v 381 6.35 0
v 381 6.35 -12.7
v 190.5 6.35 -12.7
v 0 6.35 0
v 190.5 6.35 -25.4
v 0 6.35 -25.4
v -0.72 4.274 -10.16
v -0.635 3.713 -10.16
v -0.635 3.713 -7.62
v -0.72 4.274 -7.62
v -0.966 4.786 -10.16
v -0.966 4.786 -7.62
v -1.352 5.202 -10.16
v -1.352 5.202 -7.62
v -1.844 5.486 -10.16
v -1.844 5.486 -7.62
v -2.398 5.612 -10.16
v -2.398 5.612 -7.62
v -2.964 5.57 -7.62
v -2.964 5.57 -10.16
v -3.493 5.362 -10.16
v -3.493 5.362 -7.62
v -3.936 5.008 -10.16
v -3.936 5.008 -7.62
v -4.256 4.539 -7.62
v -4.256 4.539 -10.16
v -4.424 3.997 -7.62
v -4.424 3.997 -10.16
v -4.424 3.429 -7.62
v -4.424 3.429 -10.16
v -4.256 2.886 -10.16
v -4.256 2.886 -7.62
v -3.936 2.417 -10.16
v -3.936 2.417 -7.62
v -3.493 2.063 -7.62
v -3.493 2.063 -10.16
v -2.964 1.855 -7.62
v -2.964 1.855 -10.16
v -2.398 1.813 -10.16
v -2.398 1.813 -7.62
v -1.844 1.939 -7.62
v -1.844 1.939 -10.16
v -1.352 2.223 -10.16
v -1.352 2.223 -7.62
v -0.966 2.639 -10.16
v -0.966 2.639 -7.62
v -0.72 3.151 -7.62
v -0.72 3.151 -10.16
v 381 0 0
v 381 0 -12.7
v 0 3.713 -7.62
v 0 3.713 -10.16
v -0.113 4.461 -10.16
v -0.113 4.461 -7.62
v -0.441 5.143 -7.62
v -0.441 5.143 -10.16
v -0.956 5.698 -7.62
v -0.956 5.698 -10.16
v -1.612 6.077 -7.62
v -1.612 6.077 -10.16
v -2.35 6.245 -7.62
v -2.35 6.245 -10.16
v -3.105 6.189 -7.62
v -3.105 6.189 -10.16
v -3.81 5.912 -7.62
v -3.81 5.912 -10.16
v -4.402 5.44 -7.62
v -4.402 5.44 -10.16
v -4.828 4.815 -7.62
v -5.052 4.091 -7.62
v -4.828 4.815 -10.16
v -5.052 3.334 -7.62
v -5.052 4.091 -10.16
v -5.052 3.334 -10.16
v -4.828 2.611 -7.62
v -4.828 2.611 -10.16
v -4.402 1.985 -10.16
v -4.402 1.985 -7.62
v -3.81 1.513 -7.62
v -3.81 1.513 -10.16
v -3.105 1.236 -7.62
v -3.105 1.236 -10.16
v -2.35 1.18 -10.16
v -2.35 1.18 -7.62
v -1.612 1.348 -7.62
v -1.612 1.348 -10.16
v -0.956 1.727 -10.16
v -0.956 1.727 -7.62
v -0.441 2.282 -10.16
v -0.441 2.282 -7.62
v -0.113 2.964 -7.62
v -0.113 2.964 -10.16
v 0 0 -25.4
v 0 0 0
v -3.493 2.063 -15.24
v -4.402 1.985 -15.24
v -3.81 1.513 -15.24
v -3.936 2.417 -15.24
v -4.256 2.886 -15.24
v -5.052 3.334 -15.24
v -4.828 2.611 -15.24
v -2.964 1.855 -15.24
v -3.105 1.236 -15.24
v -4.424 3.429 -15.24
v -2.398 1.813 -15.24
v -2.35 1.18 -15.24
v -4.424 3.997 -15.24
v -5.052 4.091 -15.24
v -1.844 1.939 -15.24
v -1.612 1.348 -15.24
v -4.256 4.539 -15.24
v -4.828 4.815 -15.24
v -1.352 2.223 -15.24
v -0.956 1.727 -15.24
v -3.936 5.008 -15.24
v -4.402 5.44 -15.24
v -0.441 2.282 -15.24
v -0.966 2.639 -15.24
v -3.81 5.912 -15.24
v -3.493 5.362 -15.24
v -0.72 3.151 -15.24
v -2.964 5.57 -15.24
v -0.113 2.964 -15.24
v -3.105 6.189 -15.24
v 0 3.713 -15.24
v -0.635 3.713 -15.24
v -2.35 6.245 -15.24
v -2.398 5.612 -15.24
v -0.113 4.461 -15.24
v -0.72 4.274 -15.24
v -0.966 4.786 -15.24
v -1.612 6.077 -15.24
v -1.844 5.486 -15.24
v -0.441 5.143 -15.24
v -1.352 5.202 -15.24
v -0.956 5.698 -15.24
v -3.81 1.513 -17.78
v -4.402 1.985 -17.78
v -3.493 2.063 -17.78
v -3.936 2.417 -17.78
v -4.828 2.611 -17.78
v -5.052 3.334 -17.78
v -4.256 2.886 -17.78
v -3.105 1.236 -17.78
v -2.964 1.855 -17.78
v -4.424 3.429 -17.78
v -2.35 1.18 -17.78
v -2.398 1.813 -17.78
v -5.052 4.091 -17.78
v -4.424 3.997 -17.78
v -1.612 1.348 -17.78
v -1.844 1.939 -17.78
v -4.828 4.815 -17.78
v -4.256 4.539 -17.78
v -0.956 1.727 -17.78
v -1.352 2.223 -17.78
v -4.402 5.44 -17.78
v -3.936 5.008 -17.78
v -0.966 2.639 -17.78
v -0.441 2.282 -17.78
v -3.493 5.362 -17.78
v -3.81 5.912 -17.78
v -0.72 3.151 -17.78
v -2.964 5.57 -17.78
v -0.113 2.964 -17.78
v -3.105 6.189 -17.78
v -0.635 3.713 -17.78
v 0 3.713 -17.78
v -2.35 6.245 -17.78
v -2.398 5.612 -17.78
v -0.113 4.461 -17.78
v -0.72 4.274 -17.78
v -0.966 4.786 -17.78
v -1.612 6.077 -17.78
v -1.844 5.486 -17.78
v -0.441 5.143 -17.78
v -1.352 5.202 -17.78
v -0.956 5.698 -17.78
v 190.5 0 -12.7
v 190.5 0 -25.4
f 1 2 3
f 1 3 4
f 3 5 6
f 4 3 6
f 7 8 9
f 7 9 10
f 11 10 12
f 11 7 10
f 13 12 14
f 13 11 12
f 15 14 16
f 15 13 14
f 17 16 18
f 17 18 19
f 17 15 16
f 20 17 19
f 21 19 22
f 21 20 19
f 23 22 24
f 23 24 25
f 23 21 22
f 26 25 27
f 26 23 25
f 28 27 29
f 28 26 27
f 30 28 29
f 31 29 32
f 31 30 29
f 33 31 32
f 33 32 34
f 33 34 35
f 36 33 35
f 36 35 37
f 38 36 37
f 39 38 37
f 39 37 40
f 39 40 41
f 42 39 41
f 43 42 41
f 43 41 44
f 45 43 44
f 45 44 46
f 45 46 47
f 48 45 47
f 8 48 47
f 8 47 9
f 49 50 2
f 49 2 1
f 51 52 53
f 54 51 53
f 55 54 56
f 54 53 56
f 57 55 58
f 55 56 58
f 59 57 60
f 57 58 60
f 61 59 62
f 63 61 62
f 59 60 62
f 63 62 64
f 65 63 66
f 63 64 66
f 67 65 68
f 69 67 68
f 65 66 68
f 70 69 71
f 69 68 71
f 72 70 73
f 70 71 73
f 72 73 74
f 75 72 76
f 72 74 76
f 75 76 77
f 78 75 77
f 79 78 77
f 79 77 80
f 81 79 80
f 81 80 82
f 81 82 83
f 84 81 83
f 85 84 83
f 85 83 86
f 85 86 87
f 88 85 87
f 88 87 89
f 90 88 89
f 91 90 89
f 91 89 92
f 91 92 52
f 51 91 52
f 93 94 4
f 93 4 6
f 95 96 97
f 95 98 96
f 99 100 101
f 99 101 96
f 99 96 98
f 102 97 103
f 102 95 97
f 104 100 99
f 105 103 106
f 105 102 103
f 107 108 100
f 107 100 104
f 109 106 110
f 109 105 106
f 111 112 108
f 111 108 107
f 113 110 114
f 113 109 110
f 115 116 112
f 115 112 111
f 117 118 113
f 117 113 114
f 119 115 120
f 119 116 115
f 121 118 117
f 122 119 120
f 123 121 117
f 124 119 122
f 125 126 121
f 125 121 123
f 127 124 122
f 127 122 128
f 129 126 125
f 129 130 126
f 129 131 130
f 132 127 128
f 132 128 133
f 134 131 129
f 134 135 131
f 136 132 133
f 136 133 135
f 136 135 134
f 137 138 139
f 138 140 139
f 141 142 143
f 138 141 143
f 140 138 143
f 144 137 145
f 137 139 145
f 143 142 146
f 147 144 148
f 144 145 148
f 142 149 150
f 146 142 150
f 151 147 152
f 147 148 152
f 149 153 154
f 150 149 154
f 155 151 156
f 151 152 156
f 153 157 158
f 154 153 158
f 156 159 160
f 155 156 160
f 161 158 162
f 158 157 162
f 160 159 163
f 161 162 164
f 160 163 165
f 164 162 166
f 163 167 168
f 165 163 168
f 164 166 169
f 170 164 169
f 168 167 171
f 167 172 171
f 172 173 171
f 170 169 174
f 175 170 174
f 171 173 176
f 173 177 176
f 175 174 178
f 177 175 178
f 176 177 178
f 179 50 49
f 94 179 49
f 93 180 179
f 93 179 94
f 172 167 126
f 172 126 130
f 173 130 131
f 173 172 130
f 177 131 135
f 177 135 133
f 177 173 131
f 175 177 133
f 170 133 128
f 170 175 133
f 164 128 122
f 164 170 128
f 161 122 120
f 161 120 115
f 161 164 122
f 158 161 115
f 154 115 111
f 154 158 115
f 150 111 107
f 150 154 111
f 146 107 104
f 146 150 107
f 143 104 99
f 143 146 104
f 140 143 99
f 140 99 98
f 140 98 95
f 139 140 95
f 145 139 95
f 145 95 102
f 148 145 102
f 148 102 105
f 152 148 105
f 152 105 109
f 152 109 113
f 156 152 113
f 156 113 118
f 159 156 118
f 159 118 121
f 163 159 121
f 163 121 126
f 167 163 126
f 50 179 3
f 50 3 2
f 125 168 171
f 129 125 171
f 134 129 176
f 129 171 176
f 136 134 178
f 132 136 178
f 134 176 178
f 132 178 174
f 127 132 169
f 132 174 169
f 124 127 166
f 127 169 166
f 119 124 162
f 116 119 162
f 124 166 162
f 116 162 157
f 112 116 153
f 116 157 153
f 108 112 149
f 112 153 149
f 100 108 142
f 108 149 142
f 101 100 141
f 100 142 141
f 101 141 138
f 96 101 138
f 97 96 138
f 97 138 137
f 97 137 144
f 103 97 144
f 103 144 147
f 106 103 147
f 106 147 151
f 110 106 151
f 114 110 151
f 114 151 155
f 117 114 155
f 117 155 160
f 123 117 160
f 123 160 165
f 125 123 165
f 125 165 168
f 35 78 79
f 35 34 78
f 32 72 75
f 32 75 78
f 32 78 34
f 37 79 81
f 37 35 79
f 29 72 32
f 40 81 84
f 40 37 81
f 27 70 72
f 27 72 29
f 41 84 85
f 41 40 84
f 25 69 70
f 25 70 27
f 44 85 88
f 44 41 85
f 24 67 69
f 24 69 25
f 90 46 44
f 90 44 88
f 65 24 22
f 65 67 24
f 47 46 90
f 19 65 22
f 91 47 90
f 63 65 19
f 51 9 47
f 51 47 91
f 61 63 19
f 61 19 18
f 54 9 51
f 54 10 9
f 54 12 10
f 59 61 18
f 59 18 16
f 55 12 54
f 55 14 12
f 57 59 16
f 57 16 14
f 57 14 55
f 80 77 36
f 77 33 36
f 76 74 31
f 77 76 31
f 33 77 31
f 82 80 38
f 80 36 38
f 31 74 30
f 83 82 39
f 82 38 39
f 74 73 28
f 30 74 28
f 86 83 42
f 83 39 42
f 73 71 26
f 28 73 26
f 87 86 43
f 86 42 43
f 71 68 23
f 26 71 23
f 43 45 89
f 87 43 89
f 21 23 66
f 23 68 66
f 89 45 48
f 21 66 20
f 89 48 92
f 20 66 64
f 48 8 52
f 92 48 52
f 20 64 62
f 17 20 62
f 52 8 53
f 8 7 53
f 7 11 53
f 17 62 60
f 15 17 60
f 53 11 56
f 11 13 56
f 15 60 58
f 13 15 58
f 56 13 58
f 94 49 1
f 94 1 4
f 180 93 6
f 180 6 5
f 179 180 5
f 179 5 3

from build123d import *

# Parameters (mm, degrees)
BOSS_EXTRUDE1_DEPTH      = 6.35
BOSS_EXTRUDE2_DEPTH      = 5.08
BOSS_EXTRUDE2_DEPTH_BACK = 5.08
SKETCH2_R                = 2.54
SKETCH2_R_2              = 1.905
CUT_EXTRUDE1_DEPTH       = 2.54
CUT_EXTRUDE1_DEPTH_BACK  = 2.54
SKETCH3_R                = 2.54
SKETCH3_R_2              = 1.905


with BuildPart() as part:
    # Sketch1 → Boss-Extrude1 (new body)
    with BuildSketch(Plane(origin=(0, 0, 0), x_dir=(1, 0, 0), z_dir=(0, 1, 0))):
        Polygon((190.5, 25.4), (190.5, 12.7), (381, 12.7), (381, 0), (0, 0), (0, 25.4), align=None)
    extrude(amount=BOSS_EXTRUDE1_DEPTH)


with BuildPart() as body_2:
    # Sketch2 → Boss-Extrude2 (new, two sides: drawn at the far end of the back side and taken through both)
    with BuildSketch(Plane.XY.offset(-12.7).offset(-BOSS_EXTRUDE2_DEPTH_BACK)):
        with Locations((-2.54, 3.712588247)):
            Circle(SKETCH2_R)
        with Locations((-2.54, 3.712588247)):
            Circle(SKETCH2_R_2, mode=Mode.SUBTRACT)
    extrude(amount=BOSS_EXTRUDE2_DEPTH + BOSS_EXTRUDE2_DEPTH_BACK)

    # Sketch3 → Cut-Extrude1 (cut, two sides: drawn at the far end of the back side and taken through both)
    with BuildSketch(Plane.XY.offset(-12.7).offset(-CUT_EXTRUDE1_DEPTH_BACK)):
        with Locations((-2.54, 3.712588247)):
            Circle(SKETCH3_R)
        with Locations((-2.54, 3.712588247)):
            Circle(SKETCH3_R_2, mode=Mode.SUBTRACT)
    extrude(amount=CUT_EXTRUDE1_DEPTH + CUT_EXTRUDE1_DEPTH_BACK, mode=Mode.SUBTRACT)


with BuildPart() as cut_extrude1_piece_1:
    # of the separate pieces the step leaves, piece 1, a body of its own (cut_extrude1_pieces)
    add(body_2.part.solids().sort_by_distance((0, 3.712588247, -15.24))[0])


with BuildPart() as cut_extrude1_piece_2:
    # of the separate pieces the step leaves, piece 2, a body of its own (cut_extrude1_pieces)
    add(body_2.part.solids().sort_by_distance((0, 3.712588247, -10.16))[0])


solid = Compound([part.part, cut_extrude1_piece_1.part, cut_extrude1_piece_2.part])
